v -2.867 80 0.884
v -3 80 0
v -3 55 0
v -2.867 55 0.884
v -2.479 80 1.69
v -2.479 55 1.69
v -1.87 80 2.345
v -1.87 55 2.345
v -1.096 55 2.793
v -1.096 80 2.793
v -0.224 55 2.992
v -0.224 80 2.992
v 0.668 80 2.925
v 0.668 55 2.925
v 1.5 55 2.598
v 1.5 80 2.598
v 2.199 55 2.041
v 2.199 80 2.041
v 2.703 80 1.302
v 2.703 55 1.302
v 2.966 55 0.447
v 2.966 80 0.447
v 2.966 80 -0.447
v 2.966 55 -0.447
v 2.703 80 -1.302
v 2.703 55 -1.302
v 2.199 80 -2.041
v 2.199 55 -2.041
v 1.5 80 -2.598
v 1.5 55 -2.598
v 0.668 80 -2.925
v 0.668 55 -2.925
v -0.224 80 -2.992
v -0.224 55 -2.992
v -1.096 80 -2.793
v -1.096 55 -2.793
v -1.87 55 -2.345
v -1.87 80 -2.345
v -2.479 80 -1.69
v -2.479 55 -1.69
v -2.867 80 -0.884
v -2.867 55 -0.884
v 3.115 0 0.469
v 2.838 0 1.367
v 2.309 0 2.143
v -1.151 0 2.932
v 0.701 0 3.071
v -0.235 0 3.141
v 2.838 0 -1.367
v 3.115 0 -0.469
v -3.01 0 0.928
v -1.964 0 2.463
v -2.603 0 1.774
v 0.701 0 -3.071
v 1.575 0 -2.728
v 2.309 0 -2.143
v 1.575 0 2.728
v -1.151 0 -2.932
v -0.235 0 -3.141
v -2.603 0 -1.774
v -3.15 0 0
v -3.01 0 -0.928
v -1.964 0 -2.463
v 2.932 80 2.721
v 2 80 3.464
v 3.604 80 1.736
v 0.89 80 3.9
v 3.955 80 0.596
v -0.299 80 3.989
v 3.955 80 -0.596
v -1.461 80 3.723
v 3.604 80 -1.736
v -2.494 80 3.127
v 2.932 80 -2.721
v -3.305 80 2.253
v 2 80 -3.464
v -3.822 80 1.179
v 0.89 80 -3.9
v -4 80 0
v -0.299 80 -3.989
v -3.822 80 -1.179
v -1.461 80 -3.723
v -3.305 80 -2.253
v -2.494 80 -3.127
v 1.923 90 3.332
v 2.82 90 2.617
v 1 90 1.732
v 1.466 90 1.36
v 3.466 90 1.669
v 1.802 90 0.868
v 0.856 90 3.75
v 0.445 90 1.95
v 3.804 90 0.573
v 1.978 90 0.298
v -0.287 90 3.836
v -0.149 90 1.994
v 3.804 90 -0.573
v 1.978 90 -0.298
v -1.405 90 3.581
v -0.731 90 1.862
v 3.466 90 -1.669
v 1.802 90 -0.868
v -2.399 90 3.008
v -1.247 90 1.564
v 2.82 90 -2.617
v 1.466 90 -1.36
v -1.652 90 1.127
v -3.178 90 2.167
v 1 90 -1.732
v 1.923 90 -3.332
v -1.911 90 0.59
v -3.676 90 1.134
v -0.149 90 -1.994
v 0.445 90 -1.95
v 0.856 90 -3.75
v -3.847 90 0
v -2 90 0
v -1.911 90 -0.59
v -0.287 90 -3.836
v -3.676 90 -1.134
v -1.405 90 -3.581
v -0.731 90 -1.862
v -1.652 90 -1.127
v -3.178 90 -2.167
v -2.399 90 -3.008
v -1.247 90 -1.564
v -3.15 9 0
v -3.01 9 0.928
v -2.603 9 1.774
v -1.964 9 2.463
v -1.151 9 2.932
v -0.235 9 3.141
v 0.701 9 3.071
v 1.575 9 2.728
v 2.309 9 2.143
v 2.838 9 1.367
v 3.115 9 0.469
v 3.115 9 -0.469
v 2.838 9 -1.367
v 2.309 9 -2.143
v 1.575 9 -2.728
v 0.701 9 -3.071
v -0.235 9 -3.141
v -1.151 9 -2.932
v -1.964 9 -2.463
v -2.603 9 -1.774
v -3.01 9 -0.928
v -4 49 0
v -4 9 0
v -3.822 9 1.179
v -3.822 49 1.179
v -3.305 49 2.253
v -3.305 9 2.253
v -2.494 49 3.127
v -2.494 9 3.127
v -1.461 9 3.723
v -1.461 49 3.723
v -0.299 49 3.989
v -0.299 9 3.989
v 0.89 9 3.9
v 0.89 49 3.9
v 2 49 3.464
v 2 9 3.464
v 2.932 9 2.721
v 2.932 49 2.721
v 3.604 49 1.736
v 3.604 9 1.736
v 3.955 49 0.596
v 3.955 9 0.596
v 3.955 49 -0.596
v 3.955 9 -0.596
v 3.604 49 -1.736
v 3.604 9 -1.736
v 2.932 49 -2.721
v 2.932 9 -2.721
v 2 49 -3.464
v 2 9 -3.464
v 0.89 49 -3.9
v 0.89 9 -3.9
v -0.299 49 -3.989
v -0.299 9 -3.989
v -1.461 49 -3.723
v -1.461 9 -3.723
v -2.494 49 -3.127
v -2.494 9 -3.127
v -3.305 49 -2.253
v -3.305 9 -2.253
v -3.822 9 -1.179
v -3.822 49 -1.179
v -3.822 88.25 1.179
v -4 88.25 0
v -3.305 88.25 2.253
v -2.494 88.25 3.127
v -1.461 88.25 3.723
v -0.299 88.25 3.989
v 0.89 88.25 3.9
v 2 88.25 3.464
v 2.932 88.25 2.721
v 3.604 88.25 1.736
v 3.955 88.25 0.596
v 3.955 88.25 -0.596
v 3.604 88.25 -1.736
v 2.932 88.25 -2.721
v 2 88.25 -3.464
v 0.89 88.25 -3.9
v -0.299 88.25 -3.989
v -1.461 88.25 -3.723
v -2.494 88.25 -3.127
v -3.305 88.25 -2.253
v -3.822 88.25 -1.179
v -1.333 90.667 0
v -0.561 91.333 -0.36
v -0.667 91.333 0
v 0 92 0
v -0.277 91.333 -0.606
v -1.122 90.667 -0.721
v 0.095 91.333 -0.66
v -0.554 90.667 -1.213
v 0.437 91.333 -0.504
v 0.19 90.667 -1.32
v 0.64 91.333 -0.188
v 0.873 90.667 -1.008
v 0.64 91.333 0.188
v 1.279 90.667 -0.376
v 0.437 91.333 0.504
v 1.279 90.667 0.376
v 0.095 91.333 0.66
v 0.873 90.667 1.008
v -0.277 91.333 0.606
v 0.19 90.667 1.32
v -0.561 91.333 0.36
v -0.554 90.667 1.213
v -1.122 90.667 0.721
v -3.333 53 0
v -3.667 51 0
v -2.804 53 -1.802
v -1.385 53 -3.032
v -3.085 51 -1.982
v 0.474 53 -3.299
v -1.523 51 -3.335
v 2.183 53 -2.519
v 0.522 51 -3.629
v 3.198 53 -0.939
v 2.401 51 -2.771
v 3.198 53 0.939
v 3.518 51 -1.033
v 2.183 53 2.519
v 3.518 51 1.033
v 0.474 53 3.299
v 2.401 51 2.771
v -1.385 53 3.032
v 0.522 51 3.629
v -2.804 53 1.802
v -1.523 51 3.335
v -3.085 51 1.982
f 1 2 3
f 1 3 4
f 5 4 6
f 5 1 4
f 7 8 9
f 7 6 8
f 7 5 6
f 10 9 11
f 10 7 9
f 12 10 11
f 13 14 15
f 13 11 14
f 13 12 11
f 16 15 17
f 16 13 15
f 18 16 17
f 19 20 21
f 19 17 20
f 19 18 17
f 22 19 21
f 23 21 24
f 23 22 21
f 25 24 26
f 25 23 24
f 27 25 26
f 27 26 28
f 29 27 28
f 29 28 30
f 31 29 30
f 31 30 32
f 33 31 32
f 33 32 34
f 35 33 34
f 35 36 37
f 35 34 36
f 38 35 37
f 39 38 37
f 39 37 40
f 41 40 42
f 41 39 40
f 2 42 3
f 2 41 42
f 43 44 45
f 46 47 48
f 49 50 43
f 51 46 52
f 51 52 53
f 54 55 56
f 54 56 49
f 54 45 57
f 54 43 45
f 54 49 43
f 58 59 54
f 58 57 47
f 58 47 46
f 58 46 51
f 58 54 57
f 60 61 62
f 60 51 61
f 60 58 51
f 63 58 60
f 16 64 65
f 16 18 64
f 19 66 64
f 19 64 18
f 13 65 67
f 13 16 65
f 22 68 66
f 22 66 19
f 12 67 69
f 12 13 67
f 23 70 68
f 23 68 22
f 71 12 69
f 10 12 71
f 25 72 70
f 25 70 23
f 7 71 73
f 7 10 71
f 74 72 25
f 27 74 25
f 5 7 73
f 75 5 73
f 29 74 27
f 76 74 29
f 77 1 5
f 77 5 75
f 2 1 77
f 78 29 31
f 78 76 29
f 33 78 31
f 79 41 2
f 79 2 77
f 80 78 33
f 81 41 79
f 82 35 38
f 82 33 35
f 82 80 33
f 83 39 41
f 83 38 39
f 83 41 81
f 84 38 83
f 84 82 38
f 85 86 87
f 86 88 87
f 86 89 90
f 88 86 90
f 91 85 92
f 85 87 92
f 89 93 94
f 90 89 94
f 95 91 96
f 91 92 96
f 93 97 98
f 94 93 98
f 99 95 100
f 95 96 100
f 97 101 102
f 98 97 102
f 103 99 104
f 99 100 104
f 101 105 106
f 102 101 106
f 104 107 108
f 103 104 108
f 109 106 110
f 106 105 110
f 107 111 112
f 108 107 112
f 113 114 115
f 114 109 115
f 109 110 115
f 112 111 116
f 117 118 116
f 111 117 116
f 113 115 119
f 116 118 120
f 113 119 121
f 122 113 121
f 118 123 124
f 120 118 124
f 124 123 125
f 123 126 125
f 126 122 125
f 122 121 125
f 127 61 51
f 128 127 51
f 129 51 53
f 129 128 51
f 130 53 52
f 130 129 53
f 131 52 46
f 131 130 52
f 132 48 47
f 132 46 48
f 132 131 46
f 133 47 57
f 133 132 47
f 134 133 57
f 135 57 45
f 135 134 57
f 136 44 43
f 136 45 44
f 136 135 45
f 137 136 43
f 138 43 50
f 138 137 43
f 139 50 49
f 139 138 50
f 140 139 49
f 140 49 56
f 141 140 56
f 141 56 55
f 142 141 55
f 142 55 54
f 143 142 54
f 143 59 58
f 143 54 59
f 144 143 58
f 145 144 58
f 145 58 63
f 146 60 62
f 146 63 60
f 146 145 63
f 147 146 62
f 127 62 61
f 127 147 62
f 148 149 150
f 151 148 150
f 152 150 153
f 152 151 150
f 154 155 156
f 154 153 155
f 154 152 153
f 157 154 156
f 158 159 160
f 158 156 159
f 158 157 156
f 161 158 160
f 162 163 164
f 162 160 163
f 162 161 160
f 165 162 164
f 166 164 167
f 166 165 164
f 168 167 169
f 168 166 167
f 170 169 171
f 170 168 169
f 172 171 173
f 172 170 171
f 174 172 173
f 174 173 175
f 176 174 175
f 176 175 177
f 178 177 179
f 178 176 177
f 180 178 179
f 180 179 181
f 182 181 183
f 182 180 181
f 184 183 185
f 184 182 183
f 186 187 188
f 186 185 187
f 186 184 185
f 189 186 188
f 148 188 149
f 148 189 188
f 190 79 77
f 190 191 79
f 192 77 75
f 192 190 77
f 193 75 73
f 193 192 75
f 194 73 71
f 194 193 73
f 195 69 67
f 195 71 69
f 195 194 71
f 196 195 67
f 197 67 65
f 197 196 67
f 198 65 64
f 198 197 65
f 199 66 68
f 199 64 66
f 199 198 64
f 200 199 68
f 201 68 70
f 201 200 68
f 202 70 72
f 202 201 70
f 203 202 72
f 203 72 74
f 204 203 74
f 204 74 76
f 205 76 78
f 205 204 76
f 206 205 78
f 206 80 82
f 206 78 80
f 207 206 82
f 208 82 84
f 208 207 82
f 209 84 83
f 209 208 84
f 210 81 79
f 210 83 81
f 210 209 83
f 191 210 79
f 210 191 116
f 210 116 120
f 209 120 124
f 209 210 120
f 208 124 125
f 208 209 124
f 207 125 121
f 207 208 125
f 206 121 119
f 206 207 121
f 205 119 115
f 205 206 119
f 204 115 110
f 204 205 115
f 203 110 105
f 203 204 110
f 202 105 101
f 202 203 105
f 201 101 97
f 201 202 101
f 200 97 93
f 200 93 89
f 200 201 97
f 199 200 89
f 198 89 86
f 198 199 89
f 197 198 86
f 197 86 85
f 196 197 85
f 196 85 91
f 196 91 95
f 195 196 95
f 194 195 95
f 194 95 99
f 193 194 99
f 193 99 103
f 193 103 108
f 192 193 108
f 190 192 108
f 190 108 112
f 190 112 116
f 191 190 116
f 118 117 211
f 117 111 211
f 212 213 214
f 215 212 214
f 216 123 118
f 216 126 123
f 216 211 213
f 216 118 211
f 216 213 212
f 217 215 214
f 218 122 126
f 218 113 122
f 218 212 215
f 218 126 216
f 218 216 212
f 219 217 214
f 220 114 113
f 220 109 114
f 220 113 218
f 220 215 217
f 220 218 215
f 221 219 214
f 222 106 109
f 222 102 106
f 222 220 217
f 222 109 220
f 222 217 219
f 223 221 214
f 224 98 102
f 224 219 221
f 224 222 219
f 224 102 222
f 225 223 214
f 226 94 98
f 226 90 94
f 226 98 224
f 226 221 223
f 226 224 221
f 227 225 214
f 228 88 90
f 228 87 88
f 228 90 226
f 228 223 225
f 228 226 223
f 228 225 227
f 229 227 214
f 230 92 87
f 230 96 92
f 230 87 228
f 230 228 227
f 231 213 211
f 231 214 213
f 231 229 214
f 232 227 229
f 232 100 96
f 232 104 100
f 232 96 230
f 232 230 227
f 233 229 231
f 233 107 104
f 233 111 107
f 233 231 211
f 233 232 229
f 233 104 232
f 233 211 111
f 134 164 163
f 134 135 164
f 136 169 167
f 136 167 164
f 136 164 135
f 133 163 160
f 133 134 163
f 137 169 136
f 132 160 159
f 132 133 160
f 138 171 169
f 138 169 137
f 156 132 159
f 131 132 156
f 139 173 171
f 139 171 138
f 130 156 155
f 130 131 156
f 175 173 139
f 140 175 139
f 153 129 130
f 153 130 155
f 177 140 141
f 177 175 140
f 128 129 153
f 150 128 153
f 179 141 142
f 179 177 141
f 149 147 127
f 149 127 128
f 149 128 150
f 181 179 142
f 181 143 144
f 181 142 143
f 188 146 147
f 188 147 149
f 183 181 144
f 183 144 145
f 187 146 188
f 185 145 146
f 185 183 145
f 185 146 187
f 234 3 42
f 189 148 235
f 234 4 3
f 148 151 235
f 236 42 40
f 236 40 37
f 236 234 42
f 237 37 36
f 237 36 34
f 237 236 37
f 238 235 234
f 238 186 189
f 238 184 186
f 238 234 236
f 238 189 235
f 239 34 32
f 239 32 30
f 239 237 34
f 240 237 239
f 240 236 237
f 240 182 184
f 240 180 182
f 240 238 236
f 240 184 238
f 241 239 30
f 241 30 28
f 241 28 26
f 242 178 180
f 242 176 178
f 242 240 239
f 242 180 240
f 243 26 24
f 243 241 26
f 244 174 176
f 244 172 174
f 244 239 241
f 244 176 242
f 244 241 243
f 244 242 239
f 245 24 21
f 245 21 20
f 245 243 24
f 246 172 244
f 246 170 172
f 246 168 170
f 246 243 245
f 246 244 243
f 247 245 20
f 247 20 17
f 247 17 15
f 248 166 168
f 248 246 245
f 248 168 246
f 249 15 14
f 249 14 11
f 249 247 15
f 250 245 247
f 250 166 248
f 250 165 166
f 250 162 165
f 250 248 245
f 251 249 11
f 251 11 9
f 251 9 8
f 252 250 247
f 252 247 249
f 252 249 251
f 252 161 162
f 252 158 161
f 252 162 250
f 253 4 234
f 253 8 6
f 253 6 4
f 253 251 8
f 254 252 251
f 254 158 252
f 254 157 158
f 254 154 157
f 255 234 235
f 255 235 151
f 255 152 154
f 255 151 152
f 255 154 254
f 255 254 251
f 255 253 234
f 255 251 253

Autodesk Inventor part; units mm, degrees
ref_plane "YZ Plane" through (0, 0, 0) normal (1, 0, 0) x (0, 1, 0)
ref_plane "XZ Plane" through (0, 0, 0) normal (0, 1, 0) x (-1, 0, 0)
ref_plane "XY Plane" through (0, 0, 0) normal (0, 0, 1) x (1, 0, 0)
sketch "Sketch1" plane through (0, 0, 0) normal (0, 0, 1) x (1, 0, 0)
  line L0 (-4.8, 0) -> (0.8, 0) construction
  line L1 (-3.15, 0) -> (-3.15, 9)
  line L2 (-3.15, 9) -> (-4, 9)
  line L3 (-4, 9) -> (-4, 49)
  line L4 (-4, 49) -> (-3, 55)
  line L5 (-3, 55) -> (-3, 80)
  line L6 (-3, 80) -> (-4, 80)
  line L7 (-4, 80) -> (-4, 88.25)
  line L8 (-4, 88.25) -> (-3.8469, 90)
  line L9 (-3.8469, 90) -> (-2, 90)
  line L10 (-2, 90) -> (0, 92)
  line L11 (0, 92) -> (0, 0)
  line L12 (-3.15, 0) -> (0, 0)
  dimension "d1" = 92
  dimension "d16" = 45
  dimension "d18" = 3.75
  dimension "d19" = 12
  dimension "d20" = 37
  dimension "d21" = 43
  dimension "d22" = 5
  dimension "d23" = 2
  dimension "d29" = 9
  dimension "d31" = 6.3
  dimension "d32" = 8
  dimension "d33" = 6
  dimension "d34" = 8
revolve "Revolution3" add sketch "Sketch1" angle 360 about axis through (0, 92, 0) along (0, -1, 0)
properties part number "DORMER_SPU4908_M8SpiralFl_TAP"
